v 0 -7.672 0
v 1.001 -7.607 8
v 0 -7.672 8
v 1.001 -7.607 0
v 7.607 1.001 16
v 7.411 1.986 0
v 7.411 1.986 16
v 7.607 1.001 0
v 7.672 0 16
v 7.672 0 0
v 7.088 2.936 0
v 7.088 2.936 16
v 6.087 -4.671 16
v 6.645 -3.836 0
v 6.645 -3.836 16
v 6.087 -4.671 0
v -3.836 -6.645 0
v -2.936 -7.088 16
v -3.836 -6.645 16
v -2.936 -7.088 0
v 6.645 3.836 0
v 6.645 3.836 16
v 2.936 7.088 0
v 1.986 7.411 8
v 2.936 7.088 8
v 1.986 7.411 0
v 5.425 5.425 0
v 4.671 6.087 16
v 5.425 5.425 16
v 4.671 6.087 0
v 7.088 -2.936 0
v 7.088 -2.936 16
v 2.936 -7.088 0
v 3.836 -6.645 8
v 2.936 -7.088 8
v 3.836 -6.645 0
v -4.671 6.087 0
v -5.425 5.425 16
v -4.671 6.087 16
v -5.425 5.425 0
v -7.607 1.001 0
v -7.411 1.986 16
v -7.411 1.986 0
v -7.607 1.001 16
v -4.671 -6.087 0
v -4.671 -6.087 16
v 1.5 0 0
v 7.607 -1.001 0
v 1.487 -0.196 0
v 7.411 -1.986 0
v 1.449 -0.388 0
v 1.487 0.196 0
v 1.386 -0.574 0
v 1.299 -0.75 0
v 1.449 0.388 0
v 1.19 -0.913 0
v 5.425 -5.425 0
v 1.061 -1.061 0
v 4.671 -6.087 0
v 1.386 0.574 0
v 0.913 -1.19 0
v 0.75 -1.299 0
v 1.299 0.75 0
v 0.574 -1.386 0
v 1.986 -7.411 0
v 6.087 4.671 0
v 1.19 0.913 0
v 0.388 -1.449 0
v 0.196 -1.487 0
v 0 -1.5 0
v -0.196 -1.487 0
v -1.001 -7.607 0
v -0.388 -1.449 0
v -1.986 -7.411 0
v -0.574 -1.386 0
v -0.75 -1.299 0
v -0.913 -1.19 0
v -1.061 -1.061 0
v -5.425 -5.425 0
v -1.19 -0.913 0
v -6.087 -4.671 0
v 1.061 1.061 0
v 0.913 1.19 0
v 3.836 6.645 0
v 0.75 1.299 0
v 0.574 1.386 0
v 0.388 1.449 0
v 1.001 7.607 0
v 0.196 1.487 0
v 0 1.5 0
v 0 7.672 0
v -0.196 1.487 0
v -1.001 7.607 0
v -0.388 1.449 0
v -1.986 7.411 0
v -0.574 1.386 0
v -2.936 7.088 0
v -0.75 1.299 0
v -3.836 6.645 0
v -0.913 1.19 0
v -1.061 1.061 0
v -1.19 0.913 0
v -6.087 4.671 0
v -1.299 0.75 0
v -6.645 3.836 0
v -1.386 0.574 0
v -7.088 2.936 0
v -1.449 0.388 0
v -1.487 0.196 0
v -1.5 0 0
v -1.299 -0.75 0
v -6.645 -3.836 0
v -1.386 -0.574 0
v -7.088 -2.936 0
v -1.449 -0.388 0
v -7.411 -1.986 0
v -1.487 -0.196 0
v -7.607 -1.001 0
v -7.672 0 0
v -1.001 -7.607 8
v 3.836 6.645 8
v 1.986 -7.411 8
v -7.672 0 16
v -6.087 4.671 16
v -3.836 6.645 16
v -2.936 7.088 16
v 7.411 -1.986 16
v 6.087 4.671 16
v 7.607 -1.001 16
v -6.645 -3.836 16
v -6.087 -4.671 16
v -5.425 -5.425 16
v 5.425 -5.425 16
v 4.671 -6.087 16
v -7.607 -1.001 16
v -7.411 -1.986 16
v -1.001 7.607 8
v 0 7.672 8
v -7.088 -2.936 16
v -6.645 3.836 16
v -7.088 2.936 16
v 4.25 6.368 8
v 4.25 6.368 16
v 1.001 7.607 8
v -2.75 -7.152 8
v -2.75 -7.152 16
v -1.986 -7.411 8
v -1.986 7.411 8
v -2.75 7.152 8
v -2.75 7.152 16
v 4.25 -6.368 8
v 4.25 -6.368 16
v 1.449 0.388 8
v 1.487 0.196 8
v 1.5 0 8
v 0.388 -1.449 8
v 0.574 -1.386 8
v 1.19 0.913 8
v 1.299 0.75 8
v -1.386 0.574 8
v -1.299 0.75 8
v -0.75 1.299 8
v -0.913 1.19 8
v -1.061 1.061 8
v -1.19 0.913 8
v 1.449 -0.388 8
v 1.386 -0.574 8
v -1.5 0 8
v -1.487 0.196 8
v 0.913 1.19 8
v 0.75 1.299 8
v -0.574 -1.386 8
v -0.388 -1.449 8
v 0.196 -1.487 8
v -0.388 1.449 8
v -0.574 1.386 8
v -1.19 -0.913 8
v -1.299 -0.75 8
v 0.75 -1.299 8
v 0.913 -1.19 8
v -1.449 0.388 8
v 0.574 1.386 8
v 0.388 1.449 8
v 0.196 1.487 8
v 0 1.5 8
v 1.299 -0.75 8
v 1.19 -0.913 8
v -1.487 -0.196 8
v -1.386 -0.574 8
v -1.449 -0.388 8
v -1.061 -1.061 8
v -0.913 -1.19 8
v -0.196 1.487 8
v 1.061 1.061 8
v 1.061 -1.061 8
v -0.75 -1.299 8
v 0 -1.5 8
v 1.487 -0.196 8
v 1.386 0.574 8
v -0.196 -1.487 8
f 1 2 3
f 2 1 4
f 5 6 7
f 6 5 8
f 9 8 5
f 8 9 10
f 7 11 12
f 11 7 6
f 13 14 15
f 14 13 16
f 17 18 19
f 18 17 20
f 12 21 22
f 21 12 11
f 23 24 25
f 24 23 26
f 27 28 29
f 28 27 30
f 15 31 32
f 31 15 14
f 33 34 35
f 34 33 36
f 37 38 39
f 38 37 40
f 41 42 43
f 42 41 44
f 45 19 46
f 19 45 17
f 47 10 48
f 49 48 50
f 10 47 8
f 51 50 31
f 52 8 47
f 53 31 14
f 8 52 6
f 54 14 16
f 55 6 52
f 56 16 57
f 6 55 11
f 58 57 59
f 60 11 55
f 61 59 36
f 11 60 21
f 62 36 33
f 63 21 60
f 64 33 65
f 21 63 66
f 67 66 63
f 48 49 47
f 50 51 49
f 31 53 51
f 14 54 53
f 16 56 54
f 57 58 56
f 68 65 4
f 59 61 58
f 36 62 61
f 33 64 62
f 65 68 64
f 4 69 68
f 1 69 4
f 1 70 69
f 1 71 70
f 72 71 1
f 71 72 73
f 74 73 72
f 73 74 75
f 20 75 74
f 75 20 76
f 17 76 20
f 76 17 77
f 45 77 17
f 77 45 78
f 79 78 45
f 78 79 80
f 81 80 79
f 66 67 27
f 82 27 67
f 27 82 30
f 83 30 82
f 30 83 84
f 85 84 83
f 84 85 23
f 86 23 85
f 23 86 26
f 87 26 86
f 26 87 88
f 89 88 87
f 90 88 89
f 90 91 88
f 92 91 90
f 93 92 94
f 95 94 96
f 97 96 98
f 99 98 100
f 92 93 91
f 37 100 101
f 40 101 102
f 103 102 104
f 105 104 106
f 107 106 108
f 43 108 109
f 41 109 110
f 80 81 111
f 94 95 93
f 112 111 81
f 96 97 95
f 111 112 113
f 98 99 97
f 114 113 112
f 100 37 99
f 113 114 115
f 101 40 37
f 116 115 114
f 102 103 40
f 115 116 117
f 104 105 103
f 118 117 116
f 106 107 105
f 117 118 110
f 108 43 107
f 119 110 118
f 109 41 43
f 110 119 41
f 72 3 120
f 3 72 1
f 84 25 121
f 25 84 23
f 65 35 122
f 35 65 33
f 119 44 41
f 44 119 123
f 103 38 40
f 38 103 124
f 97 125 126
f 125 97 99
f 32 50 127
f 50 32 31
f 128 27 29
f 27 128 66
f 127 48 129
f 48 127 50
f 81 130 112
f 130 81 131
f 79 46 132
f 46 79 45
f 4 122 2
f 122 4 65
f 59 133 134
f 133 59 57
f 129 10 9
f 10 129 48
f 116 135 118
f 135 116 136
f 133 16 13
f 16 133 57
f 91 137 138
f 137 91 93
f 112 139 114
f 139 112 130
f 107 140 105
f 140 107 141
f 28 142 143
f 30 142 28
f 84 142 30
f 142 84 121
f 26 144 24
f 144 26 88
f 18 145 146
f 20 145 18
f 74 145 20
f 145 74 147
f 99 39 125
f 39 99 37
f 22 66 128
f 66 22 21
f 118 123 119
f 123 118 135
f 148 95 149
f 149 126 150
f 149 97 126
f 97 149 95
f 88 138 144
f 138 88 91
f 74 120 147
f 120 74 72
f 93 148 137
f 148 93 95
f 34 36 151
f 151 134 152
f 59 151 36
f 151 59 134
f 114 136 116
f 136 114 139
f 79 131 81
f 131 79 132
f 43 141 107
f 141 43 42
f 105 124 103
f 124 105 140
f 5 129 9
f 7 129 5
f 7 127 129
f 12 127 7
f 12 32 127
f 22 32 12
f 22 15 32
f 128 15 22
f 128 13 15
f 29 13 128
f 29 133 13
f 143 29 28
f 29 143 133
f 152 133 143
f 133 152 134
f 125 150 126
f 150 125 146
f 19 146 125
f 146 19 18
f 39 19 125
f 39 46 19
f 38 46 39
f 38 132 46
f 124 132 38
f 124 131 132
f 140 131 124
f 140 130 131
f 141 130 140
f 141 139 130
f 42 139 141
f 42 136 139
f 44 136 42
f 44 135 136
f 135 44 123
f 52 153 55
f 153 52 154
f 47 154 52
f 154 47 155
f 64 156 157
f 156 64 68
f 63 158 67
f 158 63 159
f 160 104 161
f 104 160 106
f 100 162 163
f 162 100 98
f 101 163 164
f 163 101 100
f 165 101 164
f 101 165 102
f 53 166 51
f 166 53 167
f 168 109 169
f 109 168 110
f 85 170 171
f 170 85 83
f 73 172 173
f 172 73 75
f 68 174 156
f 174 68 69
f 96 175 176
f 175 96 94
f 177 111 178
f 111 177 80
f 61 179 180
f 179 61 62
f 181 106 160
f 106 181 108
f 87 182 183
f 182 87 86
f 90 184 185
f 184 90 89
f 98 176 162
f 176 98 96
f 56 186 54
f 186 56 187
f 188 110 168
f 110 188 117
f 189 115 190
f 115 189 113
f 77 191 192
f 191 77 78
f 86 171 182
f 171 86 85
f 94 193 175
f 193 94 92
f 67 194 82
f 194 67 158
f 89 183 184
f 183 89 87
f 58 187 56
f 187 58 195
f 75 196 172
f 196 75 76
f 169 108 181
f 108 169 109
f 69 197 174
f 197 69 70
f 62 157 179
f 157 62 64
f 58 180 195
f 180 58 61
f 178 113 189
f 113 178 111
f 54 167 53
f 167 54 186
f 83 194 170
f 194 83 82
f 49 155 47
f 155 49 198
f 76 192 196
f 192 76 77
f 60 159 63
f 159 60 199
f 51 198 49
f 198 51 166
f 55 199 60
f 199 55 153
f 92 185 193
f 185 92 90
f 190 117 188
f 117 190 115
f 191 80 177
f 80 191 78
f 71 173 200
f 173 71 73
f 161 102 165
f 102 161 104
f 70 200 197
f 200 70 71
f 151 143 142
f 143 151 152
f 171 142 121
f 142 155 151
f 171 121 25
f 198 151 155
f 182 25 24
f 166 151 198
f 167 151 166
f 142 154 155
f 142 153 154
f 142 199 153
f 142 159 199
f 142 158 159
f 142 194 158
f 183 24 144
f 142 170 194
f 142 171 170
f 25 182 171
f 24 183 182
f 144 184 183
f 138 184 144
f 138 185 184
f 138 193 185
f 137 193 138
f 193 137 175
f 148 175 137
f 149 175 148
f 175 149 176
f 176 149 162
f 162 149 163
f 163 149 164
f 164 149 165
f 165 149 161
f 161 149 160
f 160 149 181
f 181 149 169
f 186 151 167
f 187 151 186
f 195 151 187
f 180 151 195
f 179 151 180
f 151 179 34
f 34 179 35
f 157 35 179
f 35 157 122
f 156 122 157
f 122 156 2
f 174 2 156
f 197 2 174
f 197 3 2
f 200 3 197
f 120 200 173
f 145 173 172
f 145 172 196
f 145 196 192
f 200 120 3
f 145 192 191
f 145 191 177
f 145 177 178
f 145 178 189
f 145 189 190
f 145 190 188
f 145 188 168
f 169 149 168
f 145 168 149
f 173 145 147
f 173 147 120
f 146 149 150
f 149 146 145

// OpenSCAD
// file: insert_shapes.scad
include <rcolyer-threads.scad>;
$fn=96;

module cell_holder(cell_d, wall=1, length=100) {
    radius=cell_d/2+wall;
    difference() {
        tube(radius, length, wall);
        translate([radius+wall, 0, length/2]) cube([radius*1.66, radius*2, length*1.01], center=true);
    }
}

module threaded_top(od1, cell_d, wall=1) {
    od2 = cell_d;
    length = 20;
    nub = 8;
    nub_r = od2/2;
    diameter = 13;
    tolerance=0.4;
    thickness = length;
    ScrewHole(diameter, thickness, tolerance=tolerance, pitch=1) {
        translate([0,0,0]) cylinder(h=thickness-nub, d=od1);
        translate([0,0,length-nub/2]) cylinder(r=nub_r,h=nub,center=true);
        translate([0,0,length-nub+0.125]) cylinder(r1=od1/2, r2=nub_r, h=0.25, center=true);
    }
}

module insert_end(cell_d, pcb_dims, length=16, wall=1) {
    radius=cell_d/2;

    translate([0,0,length/2]) difference() {
        cylinder(r=radius*0.99, h=length, center=true);
        cylinder(r=1.5, h=length*1.01, center=true);
        translate([0.75,0,pcb_dims[1]/2]) {
            cube([pcb_dims[2], radius*2, pcb_dims[1]], center=true);
        }
    }
}

module tube(radius, height, wall=1) {
    difference() {
        translate([0,0,height/2]) cylinder(r=radius, h=height, center=true);
        translate([0,0,height*0.501]) cylinder(r=radius-wall, h=height*1.02, center=true);
    }
}
// file: cell_sizes.scad
// AA-size cell
aa_cell_d=14.5;
aa_cell_w_clearance=1;
aa_cell_h=50.5;
aa_cell_nubbin_h=1.5;
aa_cell_dims = [aa_cell_d, aa_cell_h];

module aa_cell_mockup() {
    translate([0,0,-aa_cell_nubbin_h/2]) cylinder(d=aa_cell_d,h=aa_cell_h-aa_cell_nubbin_h,center=true);
    translate([0,0,aa_cell_h/2-aa_cell_nubbin_h/2]) cylinder(d=aa_cell_d/2,h=aa_cell_nubbin_h,center=true);
}
// main file
include <cell_sizes.scad>
include <insert_shapes.scad>
$fn=48;

pcb_dims = [10.75,10.75,7.0];

inserts(1);

module inserts(count=1) {
    slot_w = 20;
    start_x = count/2 * -slot_w;
    for(i=[0:count-1]) {
        x = start_x + slot_w/2 + i * slot_w;
        translate([x,0,0]) insert_end(aa_cell_d+aa_cell_w_clearance, pcb_dims);
    }
}
